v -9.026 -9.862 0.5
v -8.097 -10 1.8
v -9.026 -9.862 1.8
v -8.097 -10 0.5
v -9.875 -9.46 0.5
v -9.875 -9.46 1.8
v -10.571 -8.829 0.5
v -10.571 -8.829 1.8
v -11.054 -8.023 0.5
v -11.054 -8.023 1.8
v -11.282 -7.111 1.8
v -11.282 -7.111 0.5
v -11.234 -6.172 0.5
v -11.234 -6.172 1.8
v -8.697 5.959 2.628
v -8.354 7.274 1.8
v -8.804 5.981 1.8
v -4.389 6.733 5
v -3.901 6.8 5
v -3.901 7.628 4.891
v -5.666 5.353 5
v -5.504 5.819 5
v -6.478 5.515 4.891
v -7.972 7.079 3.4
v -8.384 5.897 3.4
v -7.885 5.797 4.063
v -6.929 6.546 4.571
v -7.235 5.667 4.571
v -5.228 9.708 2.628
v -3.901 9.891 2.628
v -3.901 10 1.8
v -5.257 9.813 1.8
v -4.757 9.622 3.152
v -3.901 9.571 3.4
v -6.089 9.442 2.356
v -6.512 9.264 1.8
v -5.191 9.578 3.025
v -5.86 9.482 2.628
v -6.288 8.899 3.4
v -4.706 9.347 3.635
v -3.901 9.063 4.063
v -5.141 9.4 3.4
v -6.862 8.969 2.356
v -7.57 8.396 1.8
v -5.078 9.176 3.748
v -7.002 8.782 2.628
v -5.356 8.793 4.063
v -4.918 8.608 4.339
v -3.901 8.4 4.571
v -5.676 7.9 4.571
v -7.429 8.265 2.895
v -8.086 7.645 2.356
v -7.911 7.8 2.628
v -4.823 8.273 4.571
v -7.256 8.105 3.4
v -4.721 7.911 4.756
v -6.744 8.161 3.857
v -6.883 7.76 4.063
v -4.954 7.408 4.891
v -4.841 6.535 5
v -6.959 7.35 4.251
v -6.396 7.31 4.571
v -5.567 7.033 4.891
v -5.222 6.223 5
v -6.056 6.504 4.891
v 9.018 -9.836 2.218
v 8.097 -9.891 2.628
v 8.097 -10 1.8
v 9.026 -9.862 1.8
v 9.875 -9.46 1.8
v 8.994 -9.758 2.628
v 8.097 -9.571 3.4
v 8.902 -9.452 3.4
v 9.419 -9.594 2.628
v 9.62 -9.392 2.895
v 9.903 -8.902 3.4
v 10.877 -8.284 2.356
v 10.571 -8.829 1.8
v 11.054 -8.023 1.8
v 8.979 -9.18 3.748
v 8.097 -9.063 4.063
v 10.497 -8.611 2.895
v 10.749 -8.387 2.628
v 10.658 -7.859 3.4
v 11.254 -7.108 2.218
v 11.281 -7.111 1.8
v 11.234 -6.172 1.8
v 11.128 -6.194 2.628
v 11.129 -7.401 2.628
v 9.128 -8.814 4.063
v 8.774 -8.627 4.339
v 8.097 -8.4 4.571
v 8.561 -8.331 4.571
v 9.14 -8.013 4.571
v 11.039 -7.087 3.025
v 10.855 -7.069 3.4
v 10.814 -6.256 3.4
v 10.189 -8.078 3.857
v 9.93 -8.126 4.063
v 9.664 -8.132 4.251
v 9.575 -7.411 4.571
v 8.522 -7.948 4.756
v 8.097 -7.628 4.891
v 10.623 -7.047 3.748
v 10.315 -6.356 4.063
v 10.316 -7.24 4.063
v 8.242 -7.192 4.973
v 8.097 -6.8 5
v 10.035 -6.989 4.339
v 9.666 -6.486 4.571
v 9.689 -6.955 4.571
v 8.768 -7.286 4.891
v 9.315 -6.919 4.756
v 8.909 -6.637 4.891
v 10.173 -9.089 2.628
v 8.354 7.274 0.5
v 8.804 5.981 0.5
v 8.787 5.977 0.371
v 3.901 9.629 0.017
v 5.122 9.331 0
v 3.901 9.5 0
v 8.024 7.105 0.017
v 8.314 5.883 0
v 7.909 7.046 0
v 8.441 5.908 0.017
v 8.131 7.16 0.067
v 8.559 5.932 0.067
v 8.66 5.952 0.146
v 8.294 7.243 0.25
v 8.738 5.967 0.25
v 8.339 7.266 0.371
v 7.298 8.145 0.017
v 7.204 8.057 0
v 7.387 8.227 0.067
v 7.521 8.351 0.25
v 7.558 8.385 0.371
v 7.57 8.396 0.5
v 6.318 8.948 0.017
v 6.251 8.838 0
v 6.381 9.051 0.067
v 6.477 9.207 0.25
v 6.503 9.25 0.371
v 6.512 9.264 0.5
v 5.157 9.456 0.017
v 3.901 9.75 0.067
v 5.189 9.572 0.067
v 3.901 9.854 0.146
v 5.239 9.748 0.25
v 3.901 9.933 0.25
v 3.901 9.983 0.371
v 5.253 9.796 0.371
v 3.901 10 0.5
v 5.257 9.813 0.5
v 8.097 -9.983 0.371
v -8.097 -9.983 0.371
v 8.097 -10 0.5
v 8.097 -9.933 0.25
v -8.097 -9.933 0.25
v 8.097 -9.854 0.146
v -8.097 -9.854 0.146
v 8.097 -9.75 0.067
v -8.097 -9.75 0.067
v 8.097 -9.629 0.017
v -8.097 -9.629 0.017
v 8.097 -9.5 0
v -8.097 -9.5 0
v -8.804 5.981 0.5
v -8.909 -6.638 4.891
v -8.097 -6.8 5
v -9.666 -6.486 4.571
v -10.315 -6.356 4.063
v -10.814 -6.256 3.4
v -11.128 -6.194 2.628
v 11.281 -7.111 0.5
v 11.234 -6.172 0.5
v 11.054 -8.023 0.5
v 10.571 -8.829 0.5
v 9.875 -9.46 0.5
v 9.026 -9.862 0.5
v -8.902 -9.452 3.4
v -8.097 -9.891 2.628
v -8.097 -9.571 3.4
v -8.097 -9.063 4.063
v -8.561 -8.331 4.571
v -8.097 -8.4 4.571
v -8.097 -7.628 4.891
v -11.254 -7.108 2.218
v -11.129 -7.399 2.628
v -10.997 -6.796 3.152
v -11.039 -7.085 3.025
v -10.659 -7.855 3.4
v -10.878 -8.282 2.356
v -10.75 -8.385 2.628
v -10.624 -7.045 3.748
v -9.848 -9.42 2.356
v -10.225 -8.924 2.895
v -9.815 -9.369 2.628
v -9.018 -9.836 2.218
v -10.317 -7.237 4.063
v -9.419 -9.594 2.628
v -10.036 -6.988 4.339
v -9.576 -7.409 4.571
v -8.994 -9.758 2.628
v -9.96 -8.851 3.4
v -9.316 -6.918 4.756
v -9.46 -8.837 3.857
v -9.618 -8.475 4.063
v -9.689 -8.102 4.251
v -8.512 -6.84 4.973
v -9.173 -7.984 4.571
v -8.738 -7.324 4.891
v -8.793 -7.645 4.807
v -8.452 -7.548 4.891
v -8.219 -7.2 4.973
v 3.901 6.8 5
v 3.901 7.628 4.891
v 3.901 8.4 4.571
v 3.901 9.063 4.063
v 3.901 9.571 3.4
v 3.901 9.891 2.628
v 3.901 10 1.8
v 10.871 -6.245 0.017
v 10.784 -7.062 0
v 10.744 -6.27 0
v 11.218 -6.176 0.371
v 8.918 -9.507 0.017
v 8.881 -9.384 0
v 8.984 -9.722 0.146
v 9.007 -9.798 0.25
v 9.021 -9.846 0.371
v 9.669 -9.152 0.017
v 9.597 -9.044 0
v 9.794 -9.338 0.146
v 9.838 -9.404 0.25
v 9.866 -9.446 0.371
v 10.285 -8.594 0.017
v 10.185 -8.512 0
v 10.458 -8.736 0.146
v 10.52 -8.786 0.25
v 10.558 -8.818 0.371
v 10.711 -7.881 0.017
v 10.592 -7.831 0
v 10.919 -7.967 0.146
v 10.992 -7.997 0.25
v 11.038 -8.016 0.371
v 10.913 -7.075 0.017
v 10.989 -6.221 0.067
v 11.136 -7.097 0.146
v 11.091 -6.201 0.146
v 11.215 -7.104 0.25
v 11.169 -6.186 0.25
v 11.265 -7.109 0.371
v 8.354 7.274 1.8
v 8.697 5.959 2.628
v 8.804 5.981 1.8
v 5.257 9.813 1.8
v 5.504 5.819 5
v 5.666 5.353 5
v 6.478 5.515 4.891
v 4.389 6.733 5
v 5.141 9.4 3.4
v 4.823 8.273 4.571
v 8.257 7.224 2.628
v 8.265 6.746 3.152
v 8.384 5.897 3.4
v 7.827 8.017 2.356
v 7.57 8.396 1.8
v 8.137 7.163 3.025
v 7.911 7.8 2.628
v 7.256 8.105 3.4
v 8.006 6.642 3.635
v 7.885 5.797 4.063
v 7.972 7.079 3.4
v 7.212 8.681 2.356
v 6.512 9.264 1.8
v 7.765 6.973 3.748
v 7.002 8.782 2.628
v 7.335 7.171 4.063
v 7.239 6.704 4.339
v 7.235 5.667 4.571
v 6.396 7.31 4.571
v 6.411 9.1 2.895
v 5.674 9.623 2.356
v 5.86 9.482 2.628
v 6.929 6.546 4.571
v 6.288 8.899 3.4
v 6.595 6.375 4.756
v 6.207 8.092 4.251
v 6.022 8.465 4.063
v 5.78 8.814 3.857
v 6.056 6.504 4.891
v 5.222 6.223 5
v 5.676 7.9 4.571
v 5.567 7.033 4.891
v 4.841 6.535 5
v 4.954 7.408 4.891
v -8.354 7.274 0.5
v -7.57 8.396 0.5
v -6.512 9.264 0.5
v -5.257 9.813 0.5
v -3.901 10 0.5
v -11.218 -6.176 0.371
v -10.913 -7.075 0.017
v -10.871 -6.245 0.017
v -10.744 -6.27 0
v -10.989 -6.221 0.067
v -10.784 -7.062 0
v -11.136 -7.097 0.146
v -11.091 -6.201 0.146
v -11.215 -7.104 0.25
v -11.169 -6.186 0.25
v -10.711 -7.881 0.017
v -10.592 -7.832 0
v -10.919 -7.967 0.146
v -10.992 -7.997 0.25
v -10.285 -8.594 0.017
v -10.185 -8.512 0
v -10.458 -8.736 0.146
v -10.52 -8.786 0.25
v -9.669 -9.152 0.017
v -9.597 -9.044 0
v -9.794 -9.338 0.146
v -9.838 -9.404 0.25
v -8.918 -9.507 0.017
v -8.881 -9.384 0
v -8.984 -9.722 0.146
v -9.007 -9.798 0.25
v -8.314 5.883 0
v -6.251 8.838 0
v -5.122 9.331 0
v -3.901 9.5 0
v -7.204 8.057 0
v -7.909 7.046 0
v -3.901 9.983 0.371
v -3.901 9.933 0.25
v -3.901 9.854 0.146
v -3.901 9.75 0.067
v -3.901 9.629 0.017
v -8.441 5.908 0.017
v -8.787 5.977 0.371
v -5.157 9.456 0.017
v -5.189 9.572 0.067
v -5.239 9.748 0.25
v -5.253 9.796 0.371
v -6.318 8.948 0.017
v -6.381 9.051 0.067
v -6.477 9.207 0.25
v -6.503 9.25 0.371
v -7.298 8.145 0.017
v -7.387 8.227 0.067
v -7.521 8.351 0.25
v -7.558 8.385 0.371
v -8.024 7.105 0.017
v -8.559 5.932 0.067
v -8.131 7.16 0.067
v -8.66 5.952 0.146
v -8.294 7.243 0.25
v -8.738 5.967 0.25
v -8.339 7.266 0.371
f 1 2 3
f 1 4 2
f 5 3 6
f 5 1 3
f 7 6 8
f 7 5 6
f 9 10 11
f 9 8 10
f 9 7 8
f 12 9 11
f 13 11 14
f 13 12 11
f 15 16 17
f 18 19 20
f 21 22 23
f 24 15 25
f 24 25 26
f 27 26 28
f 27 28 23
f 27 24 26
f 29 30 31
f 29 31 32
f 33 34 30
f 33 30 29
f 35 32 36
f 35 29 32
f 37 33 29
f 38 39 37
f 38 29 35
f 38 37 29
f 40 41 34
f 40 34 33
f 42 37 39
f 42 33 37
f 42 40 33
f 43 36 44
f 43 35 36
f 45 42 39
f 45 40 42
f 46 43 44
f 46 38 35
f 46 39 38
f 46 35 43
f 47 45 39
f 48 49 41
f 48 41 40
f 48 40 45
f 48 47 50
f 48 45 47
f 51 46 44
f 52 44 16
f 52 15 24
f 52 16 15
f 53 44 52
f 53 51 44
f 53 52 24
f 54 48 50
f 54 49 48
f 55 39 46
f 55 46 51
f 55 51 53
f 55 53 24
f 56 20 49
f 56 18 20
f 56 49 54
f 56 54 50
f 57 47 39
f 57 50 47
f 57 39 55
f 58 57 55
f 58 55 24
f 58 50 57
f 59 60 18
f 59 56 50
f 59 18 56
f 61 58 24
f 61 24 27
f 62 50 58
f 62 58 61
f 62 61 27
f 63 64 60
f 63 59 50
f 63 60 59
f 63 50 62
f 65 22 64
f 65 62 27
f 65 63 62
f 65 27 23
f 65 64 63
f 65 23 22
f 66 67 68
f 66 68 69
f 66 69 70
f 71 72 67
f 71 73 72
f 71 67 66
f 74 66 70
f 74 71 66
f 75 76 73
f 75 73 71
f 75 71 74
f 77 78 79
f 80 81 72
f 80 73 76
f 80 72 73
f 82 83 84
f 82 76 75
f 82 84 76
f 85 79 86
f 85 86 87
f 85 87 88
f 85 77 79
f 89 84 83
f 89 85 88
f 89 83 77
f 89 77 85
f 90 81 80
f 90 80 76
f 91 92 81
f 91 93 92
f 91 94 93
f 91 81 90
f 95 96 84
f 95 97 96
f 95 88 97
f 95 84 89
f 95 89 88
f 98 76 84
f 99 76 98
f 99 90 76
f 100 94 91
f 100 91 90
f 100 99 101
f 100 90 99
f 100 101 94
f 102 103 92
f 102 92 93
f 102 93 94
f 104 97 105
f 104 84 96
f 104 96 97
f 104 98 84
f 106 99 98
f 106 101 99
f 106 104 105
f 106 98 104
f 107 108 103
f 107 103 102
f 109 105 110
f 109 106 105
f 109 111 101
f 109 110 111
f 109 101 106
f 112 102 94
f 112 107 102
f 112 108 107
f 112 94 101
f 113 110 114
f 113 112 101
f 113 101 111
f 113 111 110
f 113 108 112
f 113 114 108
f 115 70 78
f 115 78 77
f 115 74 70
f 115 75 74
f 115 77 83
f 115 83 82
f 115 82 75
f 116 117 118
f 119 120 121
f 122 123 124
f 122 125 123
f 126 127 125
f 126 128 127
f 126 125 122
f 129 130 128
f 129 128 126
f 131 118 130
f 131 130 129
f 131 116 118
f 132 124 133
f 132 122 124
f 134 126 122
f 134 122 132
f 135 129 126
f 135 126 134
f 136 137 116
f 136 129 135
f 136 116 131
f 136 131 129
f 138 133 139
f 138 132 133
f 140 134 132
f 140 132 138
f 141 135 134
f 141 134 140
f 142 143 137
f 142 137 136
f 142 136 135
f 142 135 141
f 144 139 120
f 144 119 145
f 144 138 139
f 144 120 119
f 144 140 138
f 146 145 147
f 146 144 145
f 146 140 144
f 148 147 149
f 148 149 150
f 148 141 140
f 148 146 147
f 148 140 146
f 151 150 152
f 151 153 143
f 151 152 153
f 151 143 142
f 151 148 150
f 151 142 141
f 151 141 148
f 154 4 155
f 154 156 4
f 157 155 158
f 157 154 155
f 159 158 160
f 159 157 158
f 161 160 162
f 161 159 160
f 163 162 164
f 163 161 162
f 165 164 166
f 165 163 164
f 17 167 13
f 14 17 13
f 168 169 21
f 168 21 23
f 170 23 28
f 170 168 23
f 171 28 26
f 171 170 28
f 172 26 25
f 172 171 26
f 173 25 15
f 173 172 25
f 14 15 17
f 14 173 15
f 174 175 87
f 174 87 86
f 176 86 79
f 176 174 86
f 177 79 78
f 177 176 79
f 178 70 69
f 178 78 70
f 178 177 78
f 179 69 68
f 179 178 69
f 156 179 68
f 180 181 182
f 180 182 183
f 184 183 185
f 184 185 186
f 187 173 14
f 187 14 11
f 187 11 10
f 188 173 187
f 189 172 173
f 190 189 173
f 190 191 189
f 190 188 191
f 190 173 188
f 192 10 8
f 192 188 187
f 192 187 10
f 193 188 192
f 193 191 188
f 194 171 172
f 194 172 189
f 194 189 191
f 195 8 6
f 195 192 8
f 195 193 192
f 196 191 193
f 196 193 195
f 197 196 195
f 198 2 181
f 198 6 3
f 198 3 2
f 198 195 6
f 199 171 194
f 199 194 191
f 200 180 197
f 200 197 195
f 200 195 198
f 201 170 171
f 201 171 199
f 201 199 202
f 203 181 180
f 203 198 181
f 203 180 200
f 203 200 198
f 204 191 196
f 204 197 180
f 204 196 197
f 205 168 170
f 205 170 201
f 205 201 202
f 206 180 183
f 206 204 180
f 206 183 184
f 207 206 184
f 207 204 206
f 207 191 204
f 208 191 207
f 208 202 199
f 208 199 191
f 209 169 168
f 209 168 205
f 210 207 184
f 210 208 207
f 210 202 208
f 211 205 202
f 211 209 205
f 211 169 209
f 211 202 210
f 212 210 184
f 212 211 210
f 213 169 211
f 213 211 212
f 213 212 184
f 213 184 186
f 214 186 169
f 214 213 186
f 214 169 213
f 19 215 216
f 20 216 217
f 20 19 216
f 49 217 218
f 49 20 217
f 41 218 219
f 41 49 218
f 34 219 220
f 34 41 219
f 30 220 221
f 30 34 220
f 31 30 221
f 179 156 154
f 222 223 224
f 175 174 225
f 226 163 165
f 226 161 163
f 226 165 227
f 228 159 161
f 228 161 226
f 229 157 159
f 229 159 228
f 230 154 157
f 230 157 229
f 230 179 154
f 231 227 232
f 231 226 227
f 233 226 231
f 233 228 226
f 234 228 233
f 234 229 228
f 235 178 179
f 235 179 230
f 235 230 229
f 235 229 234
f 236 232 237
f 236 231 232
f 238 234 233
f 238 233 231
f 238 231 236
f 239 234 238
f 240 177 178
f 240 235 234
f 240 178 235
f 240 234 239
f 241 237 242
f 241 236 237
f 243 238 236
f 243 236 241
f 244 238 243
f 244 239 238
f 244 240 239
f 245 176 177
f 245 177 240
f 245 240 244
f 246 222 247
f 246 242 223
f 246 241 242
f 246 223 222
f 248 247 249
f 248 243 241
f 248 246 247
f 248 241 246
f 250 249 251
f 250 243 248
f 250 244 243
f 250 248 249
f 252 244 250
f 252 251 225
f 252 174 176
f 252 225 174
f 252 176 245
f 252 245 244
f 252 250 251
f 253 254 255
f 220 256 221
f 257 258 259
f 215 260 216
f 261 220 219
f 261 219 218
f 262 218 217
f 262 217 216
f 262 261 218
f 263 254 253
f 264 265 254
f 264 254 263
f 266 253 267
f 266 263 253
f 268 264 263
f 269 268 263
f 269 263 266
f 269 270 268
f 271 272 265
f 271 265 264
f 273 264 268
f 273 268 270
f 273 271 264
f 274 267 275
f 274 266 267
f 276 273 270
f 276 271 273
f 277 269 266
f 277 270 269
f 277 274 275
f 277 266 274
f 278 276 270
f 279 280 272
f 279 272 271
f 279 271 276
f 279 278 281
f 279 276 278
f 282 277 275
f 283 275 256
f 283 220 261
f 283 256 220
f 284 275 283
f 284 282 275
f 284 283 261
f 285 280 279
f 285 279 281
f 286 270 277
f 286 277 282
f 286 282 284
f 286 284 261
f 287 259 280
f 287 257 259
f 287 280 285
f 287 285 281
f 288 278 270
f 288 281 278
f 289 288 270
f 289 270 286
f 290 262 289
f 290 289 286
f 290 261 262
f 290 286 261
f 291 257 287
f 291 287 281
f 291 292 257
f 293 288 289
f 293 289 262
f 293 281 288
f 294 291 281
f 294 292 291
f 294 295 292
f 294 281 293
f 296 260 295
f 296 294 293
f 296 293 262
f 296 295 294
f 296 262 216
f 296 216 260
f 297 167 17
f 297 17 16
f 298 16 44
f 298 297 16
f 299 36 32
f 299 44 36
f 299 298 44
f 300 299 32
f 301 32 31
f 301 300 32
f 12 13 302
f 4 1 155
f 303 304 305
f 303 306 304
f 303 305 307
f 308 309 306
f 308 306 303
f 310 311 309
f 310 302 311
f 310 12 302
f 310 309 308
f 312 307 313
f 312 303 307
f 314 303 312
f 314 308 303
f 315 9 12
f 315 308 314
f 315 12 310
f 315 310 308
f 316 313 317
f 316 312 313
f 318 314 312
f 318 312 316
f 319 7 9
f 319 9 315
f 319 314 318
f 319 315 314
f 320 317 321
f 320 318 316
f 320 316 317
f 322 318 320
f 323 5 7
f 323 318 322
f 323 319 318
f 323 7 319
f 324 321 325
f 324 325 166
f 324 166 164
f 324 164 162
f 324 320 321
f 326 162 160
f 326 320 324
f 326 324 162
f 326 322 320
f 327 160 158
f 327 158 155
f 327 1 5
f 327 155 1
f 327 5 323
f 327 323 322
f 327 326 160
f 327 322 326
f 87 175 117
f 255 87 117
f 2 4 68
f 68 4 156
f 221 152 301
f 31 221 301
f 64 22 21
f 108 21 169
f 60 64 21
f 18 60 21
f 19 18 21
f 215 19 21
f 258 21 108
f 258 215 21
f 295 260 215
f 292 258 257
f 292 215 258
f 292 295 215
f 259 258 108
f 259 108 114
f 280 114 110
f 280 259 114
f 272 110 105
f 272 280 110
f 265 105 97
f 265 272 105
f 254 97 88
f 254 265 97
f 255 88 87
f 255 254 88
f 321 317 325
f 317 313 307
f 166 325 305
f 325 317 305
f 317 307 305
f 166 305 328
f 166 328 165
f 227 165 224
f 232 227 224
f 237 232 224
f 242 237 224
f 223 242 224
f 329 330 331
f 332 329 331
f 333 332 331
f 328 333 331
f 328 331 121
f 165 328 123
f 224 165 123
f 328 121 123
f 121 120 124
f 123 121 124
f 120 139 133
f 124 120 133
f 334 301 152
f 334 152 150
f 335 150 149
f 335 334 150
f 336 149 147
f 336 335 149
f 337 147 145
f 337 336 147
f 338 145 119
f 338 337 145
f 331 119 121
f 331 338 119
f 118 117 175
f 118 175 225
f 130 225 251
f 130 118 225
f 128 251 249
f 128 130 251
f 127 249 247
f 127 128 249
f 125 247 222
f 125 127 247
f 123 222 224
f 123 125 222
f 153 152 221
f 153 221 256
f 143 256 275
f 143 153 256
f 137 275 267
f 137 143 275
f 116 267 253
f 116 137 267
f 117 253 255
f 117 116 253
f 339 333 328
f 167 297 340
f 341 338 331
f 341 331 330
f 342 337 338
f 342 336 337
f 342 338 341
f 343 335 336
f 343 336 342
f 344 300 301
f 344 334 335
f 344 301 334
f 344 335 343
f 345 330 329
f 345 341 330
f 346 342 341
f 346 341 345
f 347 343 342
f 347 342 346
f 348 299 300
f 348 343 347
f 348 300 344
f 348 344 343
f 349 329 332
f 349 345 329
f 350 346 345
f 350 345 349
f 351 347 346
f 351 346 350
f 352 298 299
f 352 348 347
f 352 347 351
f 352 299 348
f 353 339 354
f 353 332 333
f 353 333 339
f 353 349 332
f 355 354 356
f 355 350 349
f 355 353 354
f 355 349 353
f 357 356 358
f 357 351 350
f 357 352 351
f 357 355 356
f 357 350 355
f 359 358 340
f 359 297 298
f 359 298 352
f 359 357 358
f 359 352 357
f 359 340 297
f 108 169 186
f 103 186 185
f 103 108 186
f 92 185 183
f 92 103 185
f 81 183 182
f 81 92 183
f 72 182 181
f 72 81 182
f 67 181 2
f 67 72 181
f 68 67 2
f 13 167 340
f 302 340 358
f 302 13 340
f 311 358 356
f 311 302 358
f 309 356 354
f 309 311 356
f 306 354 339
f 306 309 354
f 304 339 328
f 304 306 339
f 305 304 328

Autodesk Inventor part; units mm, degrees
sketch "Sketch_1" plane through (0, 0, 0) normal (0, 0, 1) x (1, 0, 0)
  arc A0 (-11.2345, -6.1724) -> (-8.0966, -10) centre (-8.0966, -6.8) ccw
  line L0 (-8.0966, -10) -> (8.0966, -10)
  arc A1 (8.0966, -10) -> (11.2345, -6.1724) centre (8.0966, -6.8) ccw
  line L1 (11.2345, -6.1724) -> (8.8039, 5.9806)
  arc A2 (8.8039, 5.9806) -> (3.901, 10) centre (3.901, 5) ccw
  line L2 (3.901, 10) -> (-3.901, 10)
  arc A3 (-3.901, 10) -> (-8.8039, 5.9806) centre (-3.901, 5) ccw
  line L3 (-8.8039, 5.9806) -> (-11.2345, -6.1724)
extrude "Extrusion1" add sketch "Sketch_1" along normal blind 5
fillet "Fillet1" radius 3.2 8 edges at (-10.5713, -8.8288, 5) (0, -10, 5) (10.5713, -8.8288, 5) (10.0192, -0.0959, 5) (7.0709, 8.8667, 5) (0, 10, 5) (-7.0709, 8.8667, 5) (-10.0192, -0.0959, 5)
fillet "Fillet2" radius 0.5 8 edges at (-10.5713, -8.8288, 0) (-10.0192, -0.0959, 0) (-7.0709, 8.8667, 0) (0, 10, 0) (7.0709, 8.8667, 0) (10.0192, -0.0959, 0) (10.5713, -8.8288, 0) (0, -10, 0)
ref_plane "EIS_XY" through (0, 0, 0) normal (0, 0, 1) x (1, 0, 0)
ref_plane "EIS_YZ" through (0, 0, 0) normal (1, 0, 0) x (0, 1, 0)
ref_plane "EIS_ZX" through (0, 0, 0) normal (0, 1, 0) x (0, 0, 1)
properties part number "SCHUNK-1352153-Fingereinsatz Typ A Co-act EGP-C"
